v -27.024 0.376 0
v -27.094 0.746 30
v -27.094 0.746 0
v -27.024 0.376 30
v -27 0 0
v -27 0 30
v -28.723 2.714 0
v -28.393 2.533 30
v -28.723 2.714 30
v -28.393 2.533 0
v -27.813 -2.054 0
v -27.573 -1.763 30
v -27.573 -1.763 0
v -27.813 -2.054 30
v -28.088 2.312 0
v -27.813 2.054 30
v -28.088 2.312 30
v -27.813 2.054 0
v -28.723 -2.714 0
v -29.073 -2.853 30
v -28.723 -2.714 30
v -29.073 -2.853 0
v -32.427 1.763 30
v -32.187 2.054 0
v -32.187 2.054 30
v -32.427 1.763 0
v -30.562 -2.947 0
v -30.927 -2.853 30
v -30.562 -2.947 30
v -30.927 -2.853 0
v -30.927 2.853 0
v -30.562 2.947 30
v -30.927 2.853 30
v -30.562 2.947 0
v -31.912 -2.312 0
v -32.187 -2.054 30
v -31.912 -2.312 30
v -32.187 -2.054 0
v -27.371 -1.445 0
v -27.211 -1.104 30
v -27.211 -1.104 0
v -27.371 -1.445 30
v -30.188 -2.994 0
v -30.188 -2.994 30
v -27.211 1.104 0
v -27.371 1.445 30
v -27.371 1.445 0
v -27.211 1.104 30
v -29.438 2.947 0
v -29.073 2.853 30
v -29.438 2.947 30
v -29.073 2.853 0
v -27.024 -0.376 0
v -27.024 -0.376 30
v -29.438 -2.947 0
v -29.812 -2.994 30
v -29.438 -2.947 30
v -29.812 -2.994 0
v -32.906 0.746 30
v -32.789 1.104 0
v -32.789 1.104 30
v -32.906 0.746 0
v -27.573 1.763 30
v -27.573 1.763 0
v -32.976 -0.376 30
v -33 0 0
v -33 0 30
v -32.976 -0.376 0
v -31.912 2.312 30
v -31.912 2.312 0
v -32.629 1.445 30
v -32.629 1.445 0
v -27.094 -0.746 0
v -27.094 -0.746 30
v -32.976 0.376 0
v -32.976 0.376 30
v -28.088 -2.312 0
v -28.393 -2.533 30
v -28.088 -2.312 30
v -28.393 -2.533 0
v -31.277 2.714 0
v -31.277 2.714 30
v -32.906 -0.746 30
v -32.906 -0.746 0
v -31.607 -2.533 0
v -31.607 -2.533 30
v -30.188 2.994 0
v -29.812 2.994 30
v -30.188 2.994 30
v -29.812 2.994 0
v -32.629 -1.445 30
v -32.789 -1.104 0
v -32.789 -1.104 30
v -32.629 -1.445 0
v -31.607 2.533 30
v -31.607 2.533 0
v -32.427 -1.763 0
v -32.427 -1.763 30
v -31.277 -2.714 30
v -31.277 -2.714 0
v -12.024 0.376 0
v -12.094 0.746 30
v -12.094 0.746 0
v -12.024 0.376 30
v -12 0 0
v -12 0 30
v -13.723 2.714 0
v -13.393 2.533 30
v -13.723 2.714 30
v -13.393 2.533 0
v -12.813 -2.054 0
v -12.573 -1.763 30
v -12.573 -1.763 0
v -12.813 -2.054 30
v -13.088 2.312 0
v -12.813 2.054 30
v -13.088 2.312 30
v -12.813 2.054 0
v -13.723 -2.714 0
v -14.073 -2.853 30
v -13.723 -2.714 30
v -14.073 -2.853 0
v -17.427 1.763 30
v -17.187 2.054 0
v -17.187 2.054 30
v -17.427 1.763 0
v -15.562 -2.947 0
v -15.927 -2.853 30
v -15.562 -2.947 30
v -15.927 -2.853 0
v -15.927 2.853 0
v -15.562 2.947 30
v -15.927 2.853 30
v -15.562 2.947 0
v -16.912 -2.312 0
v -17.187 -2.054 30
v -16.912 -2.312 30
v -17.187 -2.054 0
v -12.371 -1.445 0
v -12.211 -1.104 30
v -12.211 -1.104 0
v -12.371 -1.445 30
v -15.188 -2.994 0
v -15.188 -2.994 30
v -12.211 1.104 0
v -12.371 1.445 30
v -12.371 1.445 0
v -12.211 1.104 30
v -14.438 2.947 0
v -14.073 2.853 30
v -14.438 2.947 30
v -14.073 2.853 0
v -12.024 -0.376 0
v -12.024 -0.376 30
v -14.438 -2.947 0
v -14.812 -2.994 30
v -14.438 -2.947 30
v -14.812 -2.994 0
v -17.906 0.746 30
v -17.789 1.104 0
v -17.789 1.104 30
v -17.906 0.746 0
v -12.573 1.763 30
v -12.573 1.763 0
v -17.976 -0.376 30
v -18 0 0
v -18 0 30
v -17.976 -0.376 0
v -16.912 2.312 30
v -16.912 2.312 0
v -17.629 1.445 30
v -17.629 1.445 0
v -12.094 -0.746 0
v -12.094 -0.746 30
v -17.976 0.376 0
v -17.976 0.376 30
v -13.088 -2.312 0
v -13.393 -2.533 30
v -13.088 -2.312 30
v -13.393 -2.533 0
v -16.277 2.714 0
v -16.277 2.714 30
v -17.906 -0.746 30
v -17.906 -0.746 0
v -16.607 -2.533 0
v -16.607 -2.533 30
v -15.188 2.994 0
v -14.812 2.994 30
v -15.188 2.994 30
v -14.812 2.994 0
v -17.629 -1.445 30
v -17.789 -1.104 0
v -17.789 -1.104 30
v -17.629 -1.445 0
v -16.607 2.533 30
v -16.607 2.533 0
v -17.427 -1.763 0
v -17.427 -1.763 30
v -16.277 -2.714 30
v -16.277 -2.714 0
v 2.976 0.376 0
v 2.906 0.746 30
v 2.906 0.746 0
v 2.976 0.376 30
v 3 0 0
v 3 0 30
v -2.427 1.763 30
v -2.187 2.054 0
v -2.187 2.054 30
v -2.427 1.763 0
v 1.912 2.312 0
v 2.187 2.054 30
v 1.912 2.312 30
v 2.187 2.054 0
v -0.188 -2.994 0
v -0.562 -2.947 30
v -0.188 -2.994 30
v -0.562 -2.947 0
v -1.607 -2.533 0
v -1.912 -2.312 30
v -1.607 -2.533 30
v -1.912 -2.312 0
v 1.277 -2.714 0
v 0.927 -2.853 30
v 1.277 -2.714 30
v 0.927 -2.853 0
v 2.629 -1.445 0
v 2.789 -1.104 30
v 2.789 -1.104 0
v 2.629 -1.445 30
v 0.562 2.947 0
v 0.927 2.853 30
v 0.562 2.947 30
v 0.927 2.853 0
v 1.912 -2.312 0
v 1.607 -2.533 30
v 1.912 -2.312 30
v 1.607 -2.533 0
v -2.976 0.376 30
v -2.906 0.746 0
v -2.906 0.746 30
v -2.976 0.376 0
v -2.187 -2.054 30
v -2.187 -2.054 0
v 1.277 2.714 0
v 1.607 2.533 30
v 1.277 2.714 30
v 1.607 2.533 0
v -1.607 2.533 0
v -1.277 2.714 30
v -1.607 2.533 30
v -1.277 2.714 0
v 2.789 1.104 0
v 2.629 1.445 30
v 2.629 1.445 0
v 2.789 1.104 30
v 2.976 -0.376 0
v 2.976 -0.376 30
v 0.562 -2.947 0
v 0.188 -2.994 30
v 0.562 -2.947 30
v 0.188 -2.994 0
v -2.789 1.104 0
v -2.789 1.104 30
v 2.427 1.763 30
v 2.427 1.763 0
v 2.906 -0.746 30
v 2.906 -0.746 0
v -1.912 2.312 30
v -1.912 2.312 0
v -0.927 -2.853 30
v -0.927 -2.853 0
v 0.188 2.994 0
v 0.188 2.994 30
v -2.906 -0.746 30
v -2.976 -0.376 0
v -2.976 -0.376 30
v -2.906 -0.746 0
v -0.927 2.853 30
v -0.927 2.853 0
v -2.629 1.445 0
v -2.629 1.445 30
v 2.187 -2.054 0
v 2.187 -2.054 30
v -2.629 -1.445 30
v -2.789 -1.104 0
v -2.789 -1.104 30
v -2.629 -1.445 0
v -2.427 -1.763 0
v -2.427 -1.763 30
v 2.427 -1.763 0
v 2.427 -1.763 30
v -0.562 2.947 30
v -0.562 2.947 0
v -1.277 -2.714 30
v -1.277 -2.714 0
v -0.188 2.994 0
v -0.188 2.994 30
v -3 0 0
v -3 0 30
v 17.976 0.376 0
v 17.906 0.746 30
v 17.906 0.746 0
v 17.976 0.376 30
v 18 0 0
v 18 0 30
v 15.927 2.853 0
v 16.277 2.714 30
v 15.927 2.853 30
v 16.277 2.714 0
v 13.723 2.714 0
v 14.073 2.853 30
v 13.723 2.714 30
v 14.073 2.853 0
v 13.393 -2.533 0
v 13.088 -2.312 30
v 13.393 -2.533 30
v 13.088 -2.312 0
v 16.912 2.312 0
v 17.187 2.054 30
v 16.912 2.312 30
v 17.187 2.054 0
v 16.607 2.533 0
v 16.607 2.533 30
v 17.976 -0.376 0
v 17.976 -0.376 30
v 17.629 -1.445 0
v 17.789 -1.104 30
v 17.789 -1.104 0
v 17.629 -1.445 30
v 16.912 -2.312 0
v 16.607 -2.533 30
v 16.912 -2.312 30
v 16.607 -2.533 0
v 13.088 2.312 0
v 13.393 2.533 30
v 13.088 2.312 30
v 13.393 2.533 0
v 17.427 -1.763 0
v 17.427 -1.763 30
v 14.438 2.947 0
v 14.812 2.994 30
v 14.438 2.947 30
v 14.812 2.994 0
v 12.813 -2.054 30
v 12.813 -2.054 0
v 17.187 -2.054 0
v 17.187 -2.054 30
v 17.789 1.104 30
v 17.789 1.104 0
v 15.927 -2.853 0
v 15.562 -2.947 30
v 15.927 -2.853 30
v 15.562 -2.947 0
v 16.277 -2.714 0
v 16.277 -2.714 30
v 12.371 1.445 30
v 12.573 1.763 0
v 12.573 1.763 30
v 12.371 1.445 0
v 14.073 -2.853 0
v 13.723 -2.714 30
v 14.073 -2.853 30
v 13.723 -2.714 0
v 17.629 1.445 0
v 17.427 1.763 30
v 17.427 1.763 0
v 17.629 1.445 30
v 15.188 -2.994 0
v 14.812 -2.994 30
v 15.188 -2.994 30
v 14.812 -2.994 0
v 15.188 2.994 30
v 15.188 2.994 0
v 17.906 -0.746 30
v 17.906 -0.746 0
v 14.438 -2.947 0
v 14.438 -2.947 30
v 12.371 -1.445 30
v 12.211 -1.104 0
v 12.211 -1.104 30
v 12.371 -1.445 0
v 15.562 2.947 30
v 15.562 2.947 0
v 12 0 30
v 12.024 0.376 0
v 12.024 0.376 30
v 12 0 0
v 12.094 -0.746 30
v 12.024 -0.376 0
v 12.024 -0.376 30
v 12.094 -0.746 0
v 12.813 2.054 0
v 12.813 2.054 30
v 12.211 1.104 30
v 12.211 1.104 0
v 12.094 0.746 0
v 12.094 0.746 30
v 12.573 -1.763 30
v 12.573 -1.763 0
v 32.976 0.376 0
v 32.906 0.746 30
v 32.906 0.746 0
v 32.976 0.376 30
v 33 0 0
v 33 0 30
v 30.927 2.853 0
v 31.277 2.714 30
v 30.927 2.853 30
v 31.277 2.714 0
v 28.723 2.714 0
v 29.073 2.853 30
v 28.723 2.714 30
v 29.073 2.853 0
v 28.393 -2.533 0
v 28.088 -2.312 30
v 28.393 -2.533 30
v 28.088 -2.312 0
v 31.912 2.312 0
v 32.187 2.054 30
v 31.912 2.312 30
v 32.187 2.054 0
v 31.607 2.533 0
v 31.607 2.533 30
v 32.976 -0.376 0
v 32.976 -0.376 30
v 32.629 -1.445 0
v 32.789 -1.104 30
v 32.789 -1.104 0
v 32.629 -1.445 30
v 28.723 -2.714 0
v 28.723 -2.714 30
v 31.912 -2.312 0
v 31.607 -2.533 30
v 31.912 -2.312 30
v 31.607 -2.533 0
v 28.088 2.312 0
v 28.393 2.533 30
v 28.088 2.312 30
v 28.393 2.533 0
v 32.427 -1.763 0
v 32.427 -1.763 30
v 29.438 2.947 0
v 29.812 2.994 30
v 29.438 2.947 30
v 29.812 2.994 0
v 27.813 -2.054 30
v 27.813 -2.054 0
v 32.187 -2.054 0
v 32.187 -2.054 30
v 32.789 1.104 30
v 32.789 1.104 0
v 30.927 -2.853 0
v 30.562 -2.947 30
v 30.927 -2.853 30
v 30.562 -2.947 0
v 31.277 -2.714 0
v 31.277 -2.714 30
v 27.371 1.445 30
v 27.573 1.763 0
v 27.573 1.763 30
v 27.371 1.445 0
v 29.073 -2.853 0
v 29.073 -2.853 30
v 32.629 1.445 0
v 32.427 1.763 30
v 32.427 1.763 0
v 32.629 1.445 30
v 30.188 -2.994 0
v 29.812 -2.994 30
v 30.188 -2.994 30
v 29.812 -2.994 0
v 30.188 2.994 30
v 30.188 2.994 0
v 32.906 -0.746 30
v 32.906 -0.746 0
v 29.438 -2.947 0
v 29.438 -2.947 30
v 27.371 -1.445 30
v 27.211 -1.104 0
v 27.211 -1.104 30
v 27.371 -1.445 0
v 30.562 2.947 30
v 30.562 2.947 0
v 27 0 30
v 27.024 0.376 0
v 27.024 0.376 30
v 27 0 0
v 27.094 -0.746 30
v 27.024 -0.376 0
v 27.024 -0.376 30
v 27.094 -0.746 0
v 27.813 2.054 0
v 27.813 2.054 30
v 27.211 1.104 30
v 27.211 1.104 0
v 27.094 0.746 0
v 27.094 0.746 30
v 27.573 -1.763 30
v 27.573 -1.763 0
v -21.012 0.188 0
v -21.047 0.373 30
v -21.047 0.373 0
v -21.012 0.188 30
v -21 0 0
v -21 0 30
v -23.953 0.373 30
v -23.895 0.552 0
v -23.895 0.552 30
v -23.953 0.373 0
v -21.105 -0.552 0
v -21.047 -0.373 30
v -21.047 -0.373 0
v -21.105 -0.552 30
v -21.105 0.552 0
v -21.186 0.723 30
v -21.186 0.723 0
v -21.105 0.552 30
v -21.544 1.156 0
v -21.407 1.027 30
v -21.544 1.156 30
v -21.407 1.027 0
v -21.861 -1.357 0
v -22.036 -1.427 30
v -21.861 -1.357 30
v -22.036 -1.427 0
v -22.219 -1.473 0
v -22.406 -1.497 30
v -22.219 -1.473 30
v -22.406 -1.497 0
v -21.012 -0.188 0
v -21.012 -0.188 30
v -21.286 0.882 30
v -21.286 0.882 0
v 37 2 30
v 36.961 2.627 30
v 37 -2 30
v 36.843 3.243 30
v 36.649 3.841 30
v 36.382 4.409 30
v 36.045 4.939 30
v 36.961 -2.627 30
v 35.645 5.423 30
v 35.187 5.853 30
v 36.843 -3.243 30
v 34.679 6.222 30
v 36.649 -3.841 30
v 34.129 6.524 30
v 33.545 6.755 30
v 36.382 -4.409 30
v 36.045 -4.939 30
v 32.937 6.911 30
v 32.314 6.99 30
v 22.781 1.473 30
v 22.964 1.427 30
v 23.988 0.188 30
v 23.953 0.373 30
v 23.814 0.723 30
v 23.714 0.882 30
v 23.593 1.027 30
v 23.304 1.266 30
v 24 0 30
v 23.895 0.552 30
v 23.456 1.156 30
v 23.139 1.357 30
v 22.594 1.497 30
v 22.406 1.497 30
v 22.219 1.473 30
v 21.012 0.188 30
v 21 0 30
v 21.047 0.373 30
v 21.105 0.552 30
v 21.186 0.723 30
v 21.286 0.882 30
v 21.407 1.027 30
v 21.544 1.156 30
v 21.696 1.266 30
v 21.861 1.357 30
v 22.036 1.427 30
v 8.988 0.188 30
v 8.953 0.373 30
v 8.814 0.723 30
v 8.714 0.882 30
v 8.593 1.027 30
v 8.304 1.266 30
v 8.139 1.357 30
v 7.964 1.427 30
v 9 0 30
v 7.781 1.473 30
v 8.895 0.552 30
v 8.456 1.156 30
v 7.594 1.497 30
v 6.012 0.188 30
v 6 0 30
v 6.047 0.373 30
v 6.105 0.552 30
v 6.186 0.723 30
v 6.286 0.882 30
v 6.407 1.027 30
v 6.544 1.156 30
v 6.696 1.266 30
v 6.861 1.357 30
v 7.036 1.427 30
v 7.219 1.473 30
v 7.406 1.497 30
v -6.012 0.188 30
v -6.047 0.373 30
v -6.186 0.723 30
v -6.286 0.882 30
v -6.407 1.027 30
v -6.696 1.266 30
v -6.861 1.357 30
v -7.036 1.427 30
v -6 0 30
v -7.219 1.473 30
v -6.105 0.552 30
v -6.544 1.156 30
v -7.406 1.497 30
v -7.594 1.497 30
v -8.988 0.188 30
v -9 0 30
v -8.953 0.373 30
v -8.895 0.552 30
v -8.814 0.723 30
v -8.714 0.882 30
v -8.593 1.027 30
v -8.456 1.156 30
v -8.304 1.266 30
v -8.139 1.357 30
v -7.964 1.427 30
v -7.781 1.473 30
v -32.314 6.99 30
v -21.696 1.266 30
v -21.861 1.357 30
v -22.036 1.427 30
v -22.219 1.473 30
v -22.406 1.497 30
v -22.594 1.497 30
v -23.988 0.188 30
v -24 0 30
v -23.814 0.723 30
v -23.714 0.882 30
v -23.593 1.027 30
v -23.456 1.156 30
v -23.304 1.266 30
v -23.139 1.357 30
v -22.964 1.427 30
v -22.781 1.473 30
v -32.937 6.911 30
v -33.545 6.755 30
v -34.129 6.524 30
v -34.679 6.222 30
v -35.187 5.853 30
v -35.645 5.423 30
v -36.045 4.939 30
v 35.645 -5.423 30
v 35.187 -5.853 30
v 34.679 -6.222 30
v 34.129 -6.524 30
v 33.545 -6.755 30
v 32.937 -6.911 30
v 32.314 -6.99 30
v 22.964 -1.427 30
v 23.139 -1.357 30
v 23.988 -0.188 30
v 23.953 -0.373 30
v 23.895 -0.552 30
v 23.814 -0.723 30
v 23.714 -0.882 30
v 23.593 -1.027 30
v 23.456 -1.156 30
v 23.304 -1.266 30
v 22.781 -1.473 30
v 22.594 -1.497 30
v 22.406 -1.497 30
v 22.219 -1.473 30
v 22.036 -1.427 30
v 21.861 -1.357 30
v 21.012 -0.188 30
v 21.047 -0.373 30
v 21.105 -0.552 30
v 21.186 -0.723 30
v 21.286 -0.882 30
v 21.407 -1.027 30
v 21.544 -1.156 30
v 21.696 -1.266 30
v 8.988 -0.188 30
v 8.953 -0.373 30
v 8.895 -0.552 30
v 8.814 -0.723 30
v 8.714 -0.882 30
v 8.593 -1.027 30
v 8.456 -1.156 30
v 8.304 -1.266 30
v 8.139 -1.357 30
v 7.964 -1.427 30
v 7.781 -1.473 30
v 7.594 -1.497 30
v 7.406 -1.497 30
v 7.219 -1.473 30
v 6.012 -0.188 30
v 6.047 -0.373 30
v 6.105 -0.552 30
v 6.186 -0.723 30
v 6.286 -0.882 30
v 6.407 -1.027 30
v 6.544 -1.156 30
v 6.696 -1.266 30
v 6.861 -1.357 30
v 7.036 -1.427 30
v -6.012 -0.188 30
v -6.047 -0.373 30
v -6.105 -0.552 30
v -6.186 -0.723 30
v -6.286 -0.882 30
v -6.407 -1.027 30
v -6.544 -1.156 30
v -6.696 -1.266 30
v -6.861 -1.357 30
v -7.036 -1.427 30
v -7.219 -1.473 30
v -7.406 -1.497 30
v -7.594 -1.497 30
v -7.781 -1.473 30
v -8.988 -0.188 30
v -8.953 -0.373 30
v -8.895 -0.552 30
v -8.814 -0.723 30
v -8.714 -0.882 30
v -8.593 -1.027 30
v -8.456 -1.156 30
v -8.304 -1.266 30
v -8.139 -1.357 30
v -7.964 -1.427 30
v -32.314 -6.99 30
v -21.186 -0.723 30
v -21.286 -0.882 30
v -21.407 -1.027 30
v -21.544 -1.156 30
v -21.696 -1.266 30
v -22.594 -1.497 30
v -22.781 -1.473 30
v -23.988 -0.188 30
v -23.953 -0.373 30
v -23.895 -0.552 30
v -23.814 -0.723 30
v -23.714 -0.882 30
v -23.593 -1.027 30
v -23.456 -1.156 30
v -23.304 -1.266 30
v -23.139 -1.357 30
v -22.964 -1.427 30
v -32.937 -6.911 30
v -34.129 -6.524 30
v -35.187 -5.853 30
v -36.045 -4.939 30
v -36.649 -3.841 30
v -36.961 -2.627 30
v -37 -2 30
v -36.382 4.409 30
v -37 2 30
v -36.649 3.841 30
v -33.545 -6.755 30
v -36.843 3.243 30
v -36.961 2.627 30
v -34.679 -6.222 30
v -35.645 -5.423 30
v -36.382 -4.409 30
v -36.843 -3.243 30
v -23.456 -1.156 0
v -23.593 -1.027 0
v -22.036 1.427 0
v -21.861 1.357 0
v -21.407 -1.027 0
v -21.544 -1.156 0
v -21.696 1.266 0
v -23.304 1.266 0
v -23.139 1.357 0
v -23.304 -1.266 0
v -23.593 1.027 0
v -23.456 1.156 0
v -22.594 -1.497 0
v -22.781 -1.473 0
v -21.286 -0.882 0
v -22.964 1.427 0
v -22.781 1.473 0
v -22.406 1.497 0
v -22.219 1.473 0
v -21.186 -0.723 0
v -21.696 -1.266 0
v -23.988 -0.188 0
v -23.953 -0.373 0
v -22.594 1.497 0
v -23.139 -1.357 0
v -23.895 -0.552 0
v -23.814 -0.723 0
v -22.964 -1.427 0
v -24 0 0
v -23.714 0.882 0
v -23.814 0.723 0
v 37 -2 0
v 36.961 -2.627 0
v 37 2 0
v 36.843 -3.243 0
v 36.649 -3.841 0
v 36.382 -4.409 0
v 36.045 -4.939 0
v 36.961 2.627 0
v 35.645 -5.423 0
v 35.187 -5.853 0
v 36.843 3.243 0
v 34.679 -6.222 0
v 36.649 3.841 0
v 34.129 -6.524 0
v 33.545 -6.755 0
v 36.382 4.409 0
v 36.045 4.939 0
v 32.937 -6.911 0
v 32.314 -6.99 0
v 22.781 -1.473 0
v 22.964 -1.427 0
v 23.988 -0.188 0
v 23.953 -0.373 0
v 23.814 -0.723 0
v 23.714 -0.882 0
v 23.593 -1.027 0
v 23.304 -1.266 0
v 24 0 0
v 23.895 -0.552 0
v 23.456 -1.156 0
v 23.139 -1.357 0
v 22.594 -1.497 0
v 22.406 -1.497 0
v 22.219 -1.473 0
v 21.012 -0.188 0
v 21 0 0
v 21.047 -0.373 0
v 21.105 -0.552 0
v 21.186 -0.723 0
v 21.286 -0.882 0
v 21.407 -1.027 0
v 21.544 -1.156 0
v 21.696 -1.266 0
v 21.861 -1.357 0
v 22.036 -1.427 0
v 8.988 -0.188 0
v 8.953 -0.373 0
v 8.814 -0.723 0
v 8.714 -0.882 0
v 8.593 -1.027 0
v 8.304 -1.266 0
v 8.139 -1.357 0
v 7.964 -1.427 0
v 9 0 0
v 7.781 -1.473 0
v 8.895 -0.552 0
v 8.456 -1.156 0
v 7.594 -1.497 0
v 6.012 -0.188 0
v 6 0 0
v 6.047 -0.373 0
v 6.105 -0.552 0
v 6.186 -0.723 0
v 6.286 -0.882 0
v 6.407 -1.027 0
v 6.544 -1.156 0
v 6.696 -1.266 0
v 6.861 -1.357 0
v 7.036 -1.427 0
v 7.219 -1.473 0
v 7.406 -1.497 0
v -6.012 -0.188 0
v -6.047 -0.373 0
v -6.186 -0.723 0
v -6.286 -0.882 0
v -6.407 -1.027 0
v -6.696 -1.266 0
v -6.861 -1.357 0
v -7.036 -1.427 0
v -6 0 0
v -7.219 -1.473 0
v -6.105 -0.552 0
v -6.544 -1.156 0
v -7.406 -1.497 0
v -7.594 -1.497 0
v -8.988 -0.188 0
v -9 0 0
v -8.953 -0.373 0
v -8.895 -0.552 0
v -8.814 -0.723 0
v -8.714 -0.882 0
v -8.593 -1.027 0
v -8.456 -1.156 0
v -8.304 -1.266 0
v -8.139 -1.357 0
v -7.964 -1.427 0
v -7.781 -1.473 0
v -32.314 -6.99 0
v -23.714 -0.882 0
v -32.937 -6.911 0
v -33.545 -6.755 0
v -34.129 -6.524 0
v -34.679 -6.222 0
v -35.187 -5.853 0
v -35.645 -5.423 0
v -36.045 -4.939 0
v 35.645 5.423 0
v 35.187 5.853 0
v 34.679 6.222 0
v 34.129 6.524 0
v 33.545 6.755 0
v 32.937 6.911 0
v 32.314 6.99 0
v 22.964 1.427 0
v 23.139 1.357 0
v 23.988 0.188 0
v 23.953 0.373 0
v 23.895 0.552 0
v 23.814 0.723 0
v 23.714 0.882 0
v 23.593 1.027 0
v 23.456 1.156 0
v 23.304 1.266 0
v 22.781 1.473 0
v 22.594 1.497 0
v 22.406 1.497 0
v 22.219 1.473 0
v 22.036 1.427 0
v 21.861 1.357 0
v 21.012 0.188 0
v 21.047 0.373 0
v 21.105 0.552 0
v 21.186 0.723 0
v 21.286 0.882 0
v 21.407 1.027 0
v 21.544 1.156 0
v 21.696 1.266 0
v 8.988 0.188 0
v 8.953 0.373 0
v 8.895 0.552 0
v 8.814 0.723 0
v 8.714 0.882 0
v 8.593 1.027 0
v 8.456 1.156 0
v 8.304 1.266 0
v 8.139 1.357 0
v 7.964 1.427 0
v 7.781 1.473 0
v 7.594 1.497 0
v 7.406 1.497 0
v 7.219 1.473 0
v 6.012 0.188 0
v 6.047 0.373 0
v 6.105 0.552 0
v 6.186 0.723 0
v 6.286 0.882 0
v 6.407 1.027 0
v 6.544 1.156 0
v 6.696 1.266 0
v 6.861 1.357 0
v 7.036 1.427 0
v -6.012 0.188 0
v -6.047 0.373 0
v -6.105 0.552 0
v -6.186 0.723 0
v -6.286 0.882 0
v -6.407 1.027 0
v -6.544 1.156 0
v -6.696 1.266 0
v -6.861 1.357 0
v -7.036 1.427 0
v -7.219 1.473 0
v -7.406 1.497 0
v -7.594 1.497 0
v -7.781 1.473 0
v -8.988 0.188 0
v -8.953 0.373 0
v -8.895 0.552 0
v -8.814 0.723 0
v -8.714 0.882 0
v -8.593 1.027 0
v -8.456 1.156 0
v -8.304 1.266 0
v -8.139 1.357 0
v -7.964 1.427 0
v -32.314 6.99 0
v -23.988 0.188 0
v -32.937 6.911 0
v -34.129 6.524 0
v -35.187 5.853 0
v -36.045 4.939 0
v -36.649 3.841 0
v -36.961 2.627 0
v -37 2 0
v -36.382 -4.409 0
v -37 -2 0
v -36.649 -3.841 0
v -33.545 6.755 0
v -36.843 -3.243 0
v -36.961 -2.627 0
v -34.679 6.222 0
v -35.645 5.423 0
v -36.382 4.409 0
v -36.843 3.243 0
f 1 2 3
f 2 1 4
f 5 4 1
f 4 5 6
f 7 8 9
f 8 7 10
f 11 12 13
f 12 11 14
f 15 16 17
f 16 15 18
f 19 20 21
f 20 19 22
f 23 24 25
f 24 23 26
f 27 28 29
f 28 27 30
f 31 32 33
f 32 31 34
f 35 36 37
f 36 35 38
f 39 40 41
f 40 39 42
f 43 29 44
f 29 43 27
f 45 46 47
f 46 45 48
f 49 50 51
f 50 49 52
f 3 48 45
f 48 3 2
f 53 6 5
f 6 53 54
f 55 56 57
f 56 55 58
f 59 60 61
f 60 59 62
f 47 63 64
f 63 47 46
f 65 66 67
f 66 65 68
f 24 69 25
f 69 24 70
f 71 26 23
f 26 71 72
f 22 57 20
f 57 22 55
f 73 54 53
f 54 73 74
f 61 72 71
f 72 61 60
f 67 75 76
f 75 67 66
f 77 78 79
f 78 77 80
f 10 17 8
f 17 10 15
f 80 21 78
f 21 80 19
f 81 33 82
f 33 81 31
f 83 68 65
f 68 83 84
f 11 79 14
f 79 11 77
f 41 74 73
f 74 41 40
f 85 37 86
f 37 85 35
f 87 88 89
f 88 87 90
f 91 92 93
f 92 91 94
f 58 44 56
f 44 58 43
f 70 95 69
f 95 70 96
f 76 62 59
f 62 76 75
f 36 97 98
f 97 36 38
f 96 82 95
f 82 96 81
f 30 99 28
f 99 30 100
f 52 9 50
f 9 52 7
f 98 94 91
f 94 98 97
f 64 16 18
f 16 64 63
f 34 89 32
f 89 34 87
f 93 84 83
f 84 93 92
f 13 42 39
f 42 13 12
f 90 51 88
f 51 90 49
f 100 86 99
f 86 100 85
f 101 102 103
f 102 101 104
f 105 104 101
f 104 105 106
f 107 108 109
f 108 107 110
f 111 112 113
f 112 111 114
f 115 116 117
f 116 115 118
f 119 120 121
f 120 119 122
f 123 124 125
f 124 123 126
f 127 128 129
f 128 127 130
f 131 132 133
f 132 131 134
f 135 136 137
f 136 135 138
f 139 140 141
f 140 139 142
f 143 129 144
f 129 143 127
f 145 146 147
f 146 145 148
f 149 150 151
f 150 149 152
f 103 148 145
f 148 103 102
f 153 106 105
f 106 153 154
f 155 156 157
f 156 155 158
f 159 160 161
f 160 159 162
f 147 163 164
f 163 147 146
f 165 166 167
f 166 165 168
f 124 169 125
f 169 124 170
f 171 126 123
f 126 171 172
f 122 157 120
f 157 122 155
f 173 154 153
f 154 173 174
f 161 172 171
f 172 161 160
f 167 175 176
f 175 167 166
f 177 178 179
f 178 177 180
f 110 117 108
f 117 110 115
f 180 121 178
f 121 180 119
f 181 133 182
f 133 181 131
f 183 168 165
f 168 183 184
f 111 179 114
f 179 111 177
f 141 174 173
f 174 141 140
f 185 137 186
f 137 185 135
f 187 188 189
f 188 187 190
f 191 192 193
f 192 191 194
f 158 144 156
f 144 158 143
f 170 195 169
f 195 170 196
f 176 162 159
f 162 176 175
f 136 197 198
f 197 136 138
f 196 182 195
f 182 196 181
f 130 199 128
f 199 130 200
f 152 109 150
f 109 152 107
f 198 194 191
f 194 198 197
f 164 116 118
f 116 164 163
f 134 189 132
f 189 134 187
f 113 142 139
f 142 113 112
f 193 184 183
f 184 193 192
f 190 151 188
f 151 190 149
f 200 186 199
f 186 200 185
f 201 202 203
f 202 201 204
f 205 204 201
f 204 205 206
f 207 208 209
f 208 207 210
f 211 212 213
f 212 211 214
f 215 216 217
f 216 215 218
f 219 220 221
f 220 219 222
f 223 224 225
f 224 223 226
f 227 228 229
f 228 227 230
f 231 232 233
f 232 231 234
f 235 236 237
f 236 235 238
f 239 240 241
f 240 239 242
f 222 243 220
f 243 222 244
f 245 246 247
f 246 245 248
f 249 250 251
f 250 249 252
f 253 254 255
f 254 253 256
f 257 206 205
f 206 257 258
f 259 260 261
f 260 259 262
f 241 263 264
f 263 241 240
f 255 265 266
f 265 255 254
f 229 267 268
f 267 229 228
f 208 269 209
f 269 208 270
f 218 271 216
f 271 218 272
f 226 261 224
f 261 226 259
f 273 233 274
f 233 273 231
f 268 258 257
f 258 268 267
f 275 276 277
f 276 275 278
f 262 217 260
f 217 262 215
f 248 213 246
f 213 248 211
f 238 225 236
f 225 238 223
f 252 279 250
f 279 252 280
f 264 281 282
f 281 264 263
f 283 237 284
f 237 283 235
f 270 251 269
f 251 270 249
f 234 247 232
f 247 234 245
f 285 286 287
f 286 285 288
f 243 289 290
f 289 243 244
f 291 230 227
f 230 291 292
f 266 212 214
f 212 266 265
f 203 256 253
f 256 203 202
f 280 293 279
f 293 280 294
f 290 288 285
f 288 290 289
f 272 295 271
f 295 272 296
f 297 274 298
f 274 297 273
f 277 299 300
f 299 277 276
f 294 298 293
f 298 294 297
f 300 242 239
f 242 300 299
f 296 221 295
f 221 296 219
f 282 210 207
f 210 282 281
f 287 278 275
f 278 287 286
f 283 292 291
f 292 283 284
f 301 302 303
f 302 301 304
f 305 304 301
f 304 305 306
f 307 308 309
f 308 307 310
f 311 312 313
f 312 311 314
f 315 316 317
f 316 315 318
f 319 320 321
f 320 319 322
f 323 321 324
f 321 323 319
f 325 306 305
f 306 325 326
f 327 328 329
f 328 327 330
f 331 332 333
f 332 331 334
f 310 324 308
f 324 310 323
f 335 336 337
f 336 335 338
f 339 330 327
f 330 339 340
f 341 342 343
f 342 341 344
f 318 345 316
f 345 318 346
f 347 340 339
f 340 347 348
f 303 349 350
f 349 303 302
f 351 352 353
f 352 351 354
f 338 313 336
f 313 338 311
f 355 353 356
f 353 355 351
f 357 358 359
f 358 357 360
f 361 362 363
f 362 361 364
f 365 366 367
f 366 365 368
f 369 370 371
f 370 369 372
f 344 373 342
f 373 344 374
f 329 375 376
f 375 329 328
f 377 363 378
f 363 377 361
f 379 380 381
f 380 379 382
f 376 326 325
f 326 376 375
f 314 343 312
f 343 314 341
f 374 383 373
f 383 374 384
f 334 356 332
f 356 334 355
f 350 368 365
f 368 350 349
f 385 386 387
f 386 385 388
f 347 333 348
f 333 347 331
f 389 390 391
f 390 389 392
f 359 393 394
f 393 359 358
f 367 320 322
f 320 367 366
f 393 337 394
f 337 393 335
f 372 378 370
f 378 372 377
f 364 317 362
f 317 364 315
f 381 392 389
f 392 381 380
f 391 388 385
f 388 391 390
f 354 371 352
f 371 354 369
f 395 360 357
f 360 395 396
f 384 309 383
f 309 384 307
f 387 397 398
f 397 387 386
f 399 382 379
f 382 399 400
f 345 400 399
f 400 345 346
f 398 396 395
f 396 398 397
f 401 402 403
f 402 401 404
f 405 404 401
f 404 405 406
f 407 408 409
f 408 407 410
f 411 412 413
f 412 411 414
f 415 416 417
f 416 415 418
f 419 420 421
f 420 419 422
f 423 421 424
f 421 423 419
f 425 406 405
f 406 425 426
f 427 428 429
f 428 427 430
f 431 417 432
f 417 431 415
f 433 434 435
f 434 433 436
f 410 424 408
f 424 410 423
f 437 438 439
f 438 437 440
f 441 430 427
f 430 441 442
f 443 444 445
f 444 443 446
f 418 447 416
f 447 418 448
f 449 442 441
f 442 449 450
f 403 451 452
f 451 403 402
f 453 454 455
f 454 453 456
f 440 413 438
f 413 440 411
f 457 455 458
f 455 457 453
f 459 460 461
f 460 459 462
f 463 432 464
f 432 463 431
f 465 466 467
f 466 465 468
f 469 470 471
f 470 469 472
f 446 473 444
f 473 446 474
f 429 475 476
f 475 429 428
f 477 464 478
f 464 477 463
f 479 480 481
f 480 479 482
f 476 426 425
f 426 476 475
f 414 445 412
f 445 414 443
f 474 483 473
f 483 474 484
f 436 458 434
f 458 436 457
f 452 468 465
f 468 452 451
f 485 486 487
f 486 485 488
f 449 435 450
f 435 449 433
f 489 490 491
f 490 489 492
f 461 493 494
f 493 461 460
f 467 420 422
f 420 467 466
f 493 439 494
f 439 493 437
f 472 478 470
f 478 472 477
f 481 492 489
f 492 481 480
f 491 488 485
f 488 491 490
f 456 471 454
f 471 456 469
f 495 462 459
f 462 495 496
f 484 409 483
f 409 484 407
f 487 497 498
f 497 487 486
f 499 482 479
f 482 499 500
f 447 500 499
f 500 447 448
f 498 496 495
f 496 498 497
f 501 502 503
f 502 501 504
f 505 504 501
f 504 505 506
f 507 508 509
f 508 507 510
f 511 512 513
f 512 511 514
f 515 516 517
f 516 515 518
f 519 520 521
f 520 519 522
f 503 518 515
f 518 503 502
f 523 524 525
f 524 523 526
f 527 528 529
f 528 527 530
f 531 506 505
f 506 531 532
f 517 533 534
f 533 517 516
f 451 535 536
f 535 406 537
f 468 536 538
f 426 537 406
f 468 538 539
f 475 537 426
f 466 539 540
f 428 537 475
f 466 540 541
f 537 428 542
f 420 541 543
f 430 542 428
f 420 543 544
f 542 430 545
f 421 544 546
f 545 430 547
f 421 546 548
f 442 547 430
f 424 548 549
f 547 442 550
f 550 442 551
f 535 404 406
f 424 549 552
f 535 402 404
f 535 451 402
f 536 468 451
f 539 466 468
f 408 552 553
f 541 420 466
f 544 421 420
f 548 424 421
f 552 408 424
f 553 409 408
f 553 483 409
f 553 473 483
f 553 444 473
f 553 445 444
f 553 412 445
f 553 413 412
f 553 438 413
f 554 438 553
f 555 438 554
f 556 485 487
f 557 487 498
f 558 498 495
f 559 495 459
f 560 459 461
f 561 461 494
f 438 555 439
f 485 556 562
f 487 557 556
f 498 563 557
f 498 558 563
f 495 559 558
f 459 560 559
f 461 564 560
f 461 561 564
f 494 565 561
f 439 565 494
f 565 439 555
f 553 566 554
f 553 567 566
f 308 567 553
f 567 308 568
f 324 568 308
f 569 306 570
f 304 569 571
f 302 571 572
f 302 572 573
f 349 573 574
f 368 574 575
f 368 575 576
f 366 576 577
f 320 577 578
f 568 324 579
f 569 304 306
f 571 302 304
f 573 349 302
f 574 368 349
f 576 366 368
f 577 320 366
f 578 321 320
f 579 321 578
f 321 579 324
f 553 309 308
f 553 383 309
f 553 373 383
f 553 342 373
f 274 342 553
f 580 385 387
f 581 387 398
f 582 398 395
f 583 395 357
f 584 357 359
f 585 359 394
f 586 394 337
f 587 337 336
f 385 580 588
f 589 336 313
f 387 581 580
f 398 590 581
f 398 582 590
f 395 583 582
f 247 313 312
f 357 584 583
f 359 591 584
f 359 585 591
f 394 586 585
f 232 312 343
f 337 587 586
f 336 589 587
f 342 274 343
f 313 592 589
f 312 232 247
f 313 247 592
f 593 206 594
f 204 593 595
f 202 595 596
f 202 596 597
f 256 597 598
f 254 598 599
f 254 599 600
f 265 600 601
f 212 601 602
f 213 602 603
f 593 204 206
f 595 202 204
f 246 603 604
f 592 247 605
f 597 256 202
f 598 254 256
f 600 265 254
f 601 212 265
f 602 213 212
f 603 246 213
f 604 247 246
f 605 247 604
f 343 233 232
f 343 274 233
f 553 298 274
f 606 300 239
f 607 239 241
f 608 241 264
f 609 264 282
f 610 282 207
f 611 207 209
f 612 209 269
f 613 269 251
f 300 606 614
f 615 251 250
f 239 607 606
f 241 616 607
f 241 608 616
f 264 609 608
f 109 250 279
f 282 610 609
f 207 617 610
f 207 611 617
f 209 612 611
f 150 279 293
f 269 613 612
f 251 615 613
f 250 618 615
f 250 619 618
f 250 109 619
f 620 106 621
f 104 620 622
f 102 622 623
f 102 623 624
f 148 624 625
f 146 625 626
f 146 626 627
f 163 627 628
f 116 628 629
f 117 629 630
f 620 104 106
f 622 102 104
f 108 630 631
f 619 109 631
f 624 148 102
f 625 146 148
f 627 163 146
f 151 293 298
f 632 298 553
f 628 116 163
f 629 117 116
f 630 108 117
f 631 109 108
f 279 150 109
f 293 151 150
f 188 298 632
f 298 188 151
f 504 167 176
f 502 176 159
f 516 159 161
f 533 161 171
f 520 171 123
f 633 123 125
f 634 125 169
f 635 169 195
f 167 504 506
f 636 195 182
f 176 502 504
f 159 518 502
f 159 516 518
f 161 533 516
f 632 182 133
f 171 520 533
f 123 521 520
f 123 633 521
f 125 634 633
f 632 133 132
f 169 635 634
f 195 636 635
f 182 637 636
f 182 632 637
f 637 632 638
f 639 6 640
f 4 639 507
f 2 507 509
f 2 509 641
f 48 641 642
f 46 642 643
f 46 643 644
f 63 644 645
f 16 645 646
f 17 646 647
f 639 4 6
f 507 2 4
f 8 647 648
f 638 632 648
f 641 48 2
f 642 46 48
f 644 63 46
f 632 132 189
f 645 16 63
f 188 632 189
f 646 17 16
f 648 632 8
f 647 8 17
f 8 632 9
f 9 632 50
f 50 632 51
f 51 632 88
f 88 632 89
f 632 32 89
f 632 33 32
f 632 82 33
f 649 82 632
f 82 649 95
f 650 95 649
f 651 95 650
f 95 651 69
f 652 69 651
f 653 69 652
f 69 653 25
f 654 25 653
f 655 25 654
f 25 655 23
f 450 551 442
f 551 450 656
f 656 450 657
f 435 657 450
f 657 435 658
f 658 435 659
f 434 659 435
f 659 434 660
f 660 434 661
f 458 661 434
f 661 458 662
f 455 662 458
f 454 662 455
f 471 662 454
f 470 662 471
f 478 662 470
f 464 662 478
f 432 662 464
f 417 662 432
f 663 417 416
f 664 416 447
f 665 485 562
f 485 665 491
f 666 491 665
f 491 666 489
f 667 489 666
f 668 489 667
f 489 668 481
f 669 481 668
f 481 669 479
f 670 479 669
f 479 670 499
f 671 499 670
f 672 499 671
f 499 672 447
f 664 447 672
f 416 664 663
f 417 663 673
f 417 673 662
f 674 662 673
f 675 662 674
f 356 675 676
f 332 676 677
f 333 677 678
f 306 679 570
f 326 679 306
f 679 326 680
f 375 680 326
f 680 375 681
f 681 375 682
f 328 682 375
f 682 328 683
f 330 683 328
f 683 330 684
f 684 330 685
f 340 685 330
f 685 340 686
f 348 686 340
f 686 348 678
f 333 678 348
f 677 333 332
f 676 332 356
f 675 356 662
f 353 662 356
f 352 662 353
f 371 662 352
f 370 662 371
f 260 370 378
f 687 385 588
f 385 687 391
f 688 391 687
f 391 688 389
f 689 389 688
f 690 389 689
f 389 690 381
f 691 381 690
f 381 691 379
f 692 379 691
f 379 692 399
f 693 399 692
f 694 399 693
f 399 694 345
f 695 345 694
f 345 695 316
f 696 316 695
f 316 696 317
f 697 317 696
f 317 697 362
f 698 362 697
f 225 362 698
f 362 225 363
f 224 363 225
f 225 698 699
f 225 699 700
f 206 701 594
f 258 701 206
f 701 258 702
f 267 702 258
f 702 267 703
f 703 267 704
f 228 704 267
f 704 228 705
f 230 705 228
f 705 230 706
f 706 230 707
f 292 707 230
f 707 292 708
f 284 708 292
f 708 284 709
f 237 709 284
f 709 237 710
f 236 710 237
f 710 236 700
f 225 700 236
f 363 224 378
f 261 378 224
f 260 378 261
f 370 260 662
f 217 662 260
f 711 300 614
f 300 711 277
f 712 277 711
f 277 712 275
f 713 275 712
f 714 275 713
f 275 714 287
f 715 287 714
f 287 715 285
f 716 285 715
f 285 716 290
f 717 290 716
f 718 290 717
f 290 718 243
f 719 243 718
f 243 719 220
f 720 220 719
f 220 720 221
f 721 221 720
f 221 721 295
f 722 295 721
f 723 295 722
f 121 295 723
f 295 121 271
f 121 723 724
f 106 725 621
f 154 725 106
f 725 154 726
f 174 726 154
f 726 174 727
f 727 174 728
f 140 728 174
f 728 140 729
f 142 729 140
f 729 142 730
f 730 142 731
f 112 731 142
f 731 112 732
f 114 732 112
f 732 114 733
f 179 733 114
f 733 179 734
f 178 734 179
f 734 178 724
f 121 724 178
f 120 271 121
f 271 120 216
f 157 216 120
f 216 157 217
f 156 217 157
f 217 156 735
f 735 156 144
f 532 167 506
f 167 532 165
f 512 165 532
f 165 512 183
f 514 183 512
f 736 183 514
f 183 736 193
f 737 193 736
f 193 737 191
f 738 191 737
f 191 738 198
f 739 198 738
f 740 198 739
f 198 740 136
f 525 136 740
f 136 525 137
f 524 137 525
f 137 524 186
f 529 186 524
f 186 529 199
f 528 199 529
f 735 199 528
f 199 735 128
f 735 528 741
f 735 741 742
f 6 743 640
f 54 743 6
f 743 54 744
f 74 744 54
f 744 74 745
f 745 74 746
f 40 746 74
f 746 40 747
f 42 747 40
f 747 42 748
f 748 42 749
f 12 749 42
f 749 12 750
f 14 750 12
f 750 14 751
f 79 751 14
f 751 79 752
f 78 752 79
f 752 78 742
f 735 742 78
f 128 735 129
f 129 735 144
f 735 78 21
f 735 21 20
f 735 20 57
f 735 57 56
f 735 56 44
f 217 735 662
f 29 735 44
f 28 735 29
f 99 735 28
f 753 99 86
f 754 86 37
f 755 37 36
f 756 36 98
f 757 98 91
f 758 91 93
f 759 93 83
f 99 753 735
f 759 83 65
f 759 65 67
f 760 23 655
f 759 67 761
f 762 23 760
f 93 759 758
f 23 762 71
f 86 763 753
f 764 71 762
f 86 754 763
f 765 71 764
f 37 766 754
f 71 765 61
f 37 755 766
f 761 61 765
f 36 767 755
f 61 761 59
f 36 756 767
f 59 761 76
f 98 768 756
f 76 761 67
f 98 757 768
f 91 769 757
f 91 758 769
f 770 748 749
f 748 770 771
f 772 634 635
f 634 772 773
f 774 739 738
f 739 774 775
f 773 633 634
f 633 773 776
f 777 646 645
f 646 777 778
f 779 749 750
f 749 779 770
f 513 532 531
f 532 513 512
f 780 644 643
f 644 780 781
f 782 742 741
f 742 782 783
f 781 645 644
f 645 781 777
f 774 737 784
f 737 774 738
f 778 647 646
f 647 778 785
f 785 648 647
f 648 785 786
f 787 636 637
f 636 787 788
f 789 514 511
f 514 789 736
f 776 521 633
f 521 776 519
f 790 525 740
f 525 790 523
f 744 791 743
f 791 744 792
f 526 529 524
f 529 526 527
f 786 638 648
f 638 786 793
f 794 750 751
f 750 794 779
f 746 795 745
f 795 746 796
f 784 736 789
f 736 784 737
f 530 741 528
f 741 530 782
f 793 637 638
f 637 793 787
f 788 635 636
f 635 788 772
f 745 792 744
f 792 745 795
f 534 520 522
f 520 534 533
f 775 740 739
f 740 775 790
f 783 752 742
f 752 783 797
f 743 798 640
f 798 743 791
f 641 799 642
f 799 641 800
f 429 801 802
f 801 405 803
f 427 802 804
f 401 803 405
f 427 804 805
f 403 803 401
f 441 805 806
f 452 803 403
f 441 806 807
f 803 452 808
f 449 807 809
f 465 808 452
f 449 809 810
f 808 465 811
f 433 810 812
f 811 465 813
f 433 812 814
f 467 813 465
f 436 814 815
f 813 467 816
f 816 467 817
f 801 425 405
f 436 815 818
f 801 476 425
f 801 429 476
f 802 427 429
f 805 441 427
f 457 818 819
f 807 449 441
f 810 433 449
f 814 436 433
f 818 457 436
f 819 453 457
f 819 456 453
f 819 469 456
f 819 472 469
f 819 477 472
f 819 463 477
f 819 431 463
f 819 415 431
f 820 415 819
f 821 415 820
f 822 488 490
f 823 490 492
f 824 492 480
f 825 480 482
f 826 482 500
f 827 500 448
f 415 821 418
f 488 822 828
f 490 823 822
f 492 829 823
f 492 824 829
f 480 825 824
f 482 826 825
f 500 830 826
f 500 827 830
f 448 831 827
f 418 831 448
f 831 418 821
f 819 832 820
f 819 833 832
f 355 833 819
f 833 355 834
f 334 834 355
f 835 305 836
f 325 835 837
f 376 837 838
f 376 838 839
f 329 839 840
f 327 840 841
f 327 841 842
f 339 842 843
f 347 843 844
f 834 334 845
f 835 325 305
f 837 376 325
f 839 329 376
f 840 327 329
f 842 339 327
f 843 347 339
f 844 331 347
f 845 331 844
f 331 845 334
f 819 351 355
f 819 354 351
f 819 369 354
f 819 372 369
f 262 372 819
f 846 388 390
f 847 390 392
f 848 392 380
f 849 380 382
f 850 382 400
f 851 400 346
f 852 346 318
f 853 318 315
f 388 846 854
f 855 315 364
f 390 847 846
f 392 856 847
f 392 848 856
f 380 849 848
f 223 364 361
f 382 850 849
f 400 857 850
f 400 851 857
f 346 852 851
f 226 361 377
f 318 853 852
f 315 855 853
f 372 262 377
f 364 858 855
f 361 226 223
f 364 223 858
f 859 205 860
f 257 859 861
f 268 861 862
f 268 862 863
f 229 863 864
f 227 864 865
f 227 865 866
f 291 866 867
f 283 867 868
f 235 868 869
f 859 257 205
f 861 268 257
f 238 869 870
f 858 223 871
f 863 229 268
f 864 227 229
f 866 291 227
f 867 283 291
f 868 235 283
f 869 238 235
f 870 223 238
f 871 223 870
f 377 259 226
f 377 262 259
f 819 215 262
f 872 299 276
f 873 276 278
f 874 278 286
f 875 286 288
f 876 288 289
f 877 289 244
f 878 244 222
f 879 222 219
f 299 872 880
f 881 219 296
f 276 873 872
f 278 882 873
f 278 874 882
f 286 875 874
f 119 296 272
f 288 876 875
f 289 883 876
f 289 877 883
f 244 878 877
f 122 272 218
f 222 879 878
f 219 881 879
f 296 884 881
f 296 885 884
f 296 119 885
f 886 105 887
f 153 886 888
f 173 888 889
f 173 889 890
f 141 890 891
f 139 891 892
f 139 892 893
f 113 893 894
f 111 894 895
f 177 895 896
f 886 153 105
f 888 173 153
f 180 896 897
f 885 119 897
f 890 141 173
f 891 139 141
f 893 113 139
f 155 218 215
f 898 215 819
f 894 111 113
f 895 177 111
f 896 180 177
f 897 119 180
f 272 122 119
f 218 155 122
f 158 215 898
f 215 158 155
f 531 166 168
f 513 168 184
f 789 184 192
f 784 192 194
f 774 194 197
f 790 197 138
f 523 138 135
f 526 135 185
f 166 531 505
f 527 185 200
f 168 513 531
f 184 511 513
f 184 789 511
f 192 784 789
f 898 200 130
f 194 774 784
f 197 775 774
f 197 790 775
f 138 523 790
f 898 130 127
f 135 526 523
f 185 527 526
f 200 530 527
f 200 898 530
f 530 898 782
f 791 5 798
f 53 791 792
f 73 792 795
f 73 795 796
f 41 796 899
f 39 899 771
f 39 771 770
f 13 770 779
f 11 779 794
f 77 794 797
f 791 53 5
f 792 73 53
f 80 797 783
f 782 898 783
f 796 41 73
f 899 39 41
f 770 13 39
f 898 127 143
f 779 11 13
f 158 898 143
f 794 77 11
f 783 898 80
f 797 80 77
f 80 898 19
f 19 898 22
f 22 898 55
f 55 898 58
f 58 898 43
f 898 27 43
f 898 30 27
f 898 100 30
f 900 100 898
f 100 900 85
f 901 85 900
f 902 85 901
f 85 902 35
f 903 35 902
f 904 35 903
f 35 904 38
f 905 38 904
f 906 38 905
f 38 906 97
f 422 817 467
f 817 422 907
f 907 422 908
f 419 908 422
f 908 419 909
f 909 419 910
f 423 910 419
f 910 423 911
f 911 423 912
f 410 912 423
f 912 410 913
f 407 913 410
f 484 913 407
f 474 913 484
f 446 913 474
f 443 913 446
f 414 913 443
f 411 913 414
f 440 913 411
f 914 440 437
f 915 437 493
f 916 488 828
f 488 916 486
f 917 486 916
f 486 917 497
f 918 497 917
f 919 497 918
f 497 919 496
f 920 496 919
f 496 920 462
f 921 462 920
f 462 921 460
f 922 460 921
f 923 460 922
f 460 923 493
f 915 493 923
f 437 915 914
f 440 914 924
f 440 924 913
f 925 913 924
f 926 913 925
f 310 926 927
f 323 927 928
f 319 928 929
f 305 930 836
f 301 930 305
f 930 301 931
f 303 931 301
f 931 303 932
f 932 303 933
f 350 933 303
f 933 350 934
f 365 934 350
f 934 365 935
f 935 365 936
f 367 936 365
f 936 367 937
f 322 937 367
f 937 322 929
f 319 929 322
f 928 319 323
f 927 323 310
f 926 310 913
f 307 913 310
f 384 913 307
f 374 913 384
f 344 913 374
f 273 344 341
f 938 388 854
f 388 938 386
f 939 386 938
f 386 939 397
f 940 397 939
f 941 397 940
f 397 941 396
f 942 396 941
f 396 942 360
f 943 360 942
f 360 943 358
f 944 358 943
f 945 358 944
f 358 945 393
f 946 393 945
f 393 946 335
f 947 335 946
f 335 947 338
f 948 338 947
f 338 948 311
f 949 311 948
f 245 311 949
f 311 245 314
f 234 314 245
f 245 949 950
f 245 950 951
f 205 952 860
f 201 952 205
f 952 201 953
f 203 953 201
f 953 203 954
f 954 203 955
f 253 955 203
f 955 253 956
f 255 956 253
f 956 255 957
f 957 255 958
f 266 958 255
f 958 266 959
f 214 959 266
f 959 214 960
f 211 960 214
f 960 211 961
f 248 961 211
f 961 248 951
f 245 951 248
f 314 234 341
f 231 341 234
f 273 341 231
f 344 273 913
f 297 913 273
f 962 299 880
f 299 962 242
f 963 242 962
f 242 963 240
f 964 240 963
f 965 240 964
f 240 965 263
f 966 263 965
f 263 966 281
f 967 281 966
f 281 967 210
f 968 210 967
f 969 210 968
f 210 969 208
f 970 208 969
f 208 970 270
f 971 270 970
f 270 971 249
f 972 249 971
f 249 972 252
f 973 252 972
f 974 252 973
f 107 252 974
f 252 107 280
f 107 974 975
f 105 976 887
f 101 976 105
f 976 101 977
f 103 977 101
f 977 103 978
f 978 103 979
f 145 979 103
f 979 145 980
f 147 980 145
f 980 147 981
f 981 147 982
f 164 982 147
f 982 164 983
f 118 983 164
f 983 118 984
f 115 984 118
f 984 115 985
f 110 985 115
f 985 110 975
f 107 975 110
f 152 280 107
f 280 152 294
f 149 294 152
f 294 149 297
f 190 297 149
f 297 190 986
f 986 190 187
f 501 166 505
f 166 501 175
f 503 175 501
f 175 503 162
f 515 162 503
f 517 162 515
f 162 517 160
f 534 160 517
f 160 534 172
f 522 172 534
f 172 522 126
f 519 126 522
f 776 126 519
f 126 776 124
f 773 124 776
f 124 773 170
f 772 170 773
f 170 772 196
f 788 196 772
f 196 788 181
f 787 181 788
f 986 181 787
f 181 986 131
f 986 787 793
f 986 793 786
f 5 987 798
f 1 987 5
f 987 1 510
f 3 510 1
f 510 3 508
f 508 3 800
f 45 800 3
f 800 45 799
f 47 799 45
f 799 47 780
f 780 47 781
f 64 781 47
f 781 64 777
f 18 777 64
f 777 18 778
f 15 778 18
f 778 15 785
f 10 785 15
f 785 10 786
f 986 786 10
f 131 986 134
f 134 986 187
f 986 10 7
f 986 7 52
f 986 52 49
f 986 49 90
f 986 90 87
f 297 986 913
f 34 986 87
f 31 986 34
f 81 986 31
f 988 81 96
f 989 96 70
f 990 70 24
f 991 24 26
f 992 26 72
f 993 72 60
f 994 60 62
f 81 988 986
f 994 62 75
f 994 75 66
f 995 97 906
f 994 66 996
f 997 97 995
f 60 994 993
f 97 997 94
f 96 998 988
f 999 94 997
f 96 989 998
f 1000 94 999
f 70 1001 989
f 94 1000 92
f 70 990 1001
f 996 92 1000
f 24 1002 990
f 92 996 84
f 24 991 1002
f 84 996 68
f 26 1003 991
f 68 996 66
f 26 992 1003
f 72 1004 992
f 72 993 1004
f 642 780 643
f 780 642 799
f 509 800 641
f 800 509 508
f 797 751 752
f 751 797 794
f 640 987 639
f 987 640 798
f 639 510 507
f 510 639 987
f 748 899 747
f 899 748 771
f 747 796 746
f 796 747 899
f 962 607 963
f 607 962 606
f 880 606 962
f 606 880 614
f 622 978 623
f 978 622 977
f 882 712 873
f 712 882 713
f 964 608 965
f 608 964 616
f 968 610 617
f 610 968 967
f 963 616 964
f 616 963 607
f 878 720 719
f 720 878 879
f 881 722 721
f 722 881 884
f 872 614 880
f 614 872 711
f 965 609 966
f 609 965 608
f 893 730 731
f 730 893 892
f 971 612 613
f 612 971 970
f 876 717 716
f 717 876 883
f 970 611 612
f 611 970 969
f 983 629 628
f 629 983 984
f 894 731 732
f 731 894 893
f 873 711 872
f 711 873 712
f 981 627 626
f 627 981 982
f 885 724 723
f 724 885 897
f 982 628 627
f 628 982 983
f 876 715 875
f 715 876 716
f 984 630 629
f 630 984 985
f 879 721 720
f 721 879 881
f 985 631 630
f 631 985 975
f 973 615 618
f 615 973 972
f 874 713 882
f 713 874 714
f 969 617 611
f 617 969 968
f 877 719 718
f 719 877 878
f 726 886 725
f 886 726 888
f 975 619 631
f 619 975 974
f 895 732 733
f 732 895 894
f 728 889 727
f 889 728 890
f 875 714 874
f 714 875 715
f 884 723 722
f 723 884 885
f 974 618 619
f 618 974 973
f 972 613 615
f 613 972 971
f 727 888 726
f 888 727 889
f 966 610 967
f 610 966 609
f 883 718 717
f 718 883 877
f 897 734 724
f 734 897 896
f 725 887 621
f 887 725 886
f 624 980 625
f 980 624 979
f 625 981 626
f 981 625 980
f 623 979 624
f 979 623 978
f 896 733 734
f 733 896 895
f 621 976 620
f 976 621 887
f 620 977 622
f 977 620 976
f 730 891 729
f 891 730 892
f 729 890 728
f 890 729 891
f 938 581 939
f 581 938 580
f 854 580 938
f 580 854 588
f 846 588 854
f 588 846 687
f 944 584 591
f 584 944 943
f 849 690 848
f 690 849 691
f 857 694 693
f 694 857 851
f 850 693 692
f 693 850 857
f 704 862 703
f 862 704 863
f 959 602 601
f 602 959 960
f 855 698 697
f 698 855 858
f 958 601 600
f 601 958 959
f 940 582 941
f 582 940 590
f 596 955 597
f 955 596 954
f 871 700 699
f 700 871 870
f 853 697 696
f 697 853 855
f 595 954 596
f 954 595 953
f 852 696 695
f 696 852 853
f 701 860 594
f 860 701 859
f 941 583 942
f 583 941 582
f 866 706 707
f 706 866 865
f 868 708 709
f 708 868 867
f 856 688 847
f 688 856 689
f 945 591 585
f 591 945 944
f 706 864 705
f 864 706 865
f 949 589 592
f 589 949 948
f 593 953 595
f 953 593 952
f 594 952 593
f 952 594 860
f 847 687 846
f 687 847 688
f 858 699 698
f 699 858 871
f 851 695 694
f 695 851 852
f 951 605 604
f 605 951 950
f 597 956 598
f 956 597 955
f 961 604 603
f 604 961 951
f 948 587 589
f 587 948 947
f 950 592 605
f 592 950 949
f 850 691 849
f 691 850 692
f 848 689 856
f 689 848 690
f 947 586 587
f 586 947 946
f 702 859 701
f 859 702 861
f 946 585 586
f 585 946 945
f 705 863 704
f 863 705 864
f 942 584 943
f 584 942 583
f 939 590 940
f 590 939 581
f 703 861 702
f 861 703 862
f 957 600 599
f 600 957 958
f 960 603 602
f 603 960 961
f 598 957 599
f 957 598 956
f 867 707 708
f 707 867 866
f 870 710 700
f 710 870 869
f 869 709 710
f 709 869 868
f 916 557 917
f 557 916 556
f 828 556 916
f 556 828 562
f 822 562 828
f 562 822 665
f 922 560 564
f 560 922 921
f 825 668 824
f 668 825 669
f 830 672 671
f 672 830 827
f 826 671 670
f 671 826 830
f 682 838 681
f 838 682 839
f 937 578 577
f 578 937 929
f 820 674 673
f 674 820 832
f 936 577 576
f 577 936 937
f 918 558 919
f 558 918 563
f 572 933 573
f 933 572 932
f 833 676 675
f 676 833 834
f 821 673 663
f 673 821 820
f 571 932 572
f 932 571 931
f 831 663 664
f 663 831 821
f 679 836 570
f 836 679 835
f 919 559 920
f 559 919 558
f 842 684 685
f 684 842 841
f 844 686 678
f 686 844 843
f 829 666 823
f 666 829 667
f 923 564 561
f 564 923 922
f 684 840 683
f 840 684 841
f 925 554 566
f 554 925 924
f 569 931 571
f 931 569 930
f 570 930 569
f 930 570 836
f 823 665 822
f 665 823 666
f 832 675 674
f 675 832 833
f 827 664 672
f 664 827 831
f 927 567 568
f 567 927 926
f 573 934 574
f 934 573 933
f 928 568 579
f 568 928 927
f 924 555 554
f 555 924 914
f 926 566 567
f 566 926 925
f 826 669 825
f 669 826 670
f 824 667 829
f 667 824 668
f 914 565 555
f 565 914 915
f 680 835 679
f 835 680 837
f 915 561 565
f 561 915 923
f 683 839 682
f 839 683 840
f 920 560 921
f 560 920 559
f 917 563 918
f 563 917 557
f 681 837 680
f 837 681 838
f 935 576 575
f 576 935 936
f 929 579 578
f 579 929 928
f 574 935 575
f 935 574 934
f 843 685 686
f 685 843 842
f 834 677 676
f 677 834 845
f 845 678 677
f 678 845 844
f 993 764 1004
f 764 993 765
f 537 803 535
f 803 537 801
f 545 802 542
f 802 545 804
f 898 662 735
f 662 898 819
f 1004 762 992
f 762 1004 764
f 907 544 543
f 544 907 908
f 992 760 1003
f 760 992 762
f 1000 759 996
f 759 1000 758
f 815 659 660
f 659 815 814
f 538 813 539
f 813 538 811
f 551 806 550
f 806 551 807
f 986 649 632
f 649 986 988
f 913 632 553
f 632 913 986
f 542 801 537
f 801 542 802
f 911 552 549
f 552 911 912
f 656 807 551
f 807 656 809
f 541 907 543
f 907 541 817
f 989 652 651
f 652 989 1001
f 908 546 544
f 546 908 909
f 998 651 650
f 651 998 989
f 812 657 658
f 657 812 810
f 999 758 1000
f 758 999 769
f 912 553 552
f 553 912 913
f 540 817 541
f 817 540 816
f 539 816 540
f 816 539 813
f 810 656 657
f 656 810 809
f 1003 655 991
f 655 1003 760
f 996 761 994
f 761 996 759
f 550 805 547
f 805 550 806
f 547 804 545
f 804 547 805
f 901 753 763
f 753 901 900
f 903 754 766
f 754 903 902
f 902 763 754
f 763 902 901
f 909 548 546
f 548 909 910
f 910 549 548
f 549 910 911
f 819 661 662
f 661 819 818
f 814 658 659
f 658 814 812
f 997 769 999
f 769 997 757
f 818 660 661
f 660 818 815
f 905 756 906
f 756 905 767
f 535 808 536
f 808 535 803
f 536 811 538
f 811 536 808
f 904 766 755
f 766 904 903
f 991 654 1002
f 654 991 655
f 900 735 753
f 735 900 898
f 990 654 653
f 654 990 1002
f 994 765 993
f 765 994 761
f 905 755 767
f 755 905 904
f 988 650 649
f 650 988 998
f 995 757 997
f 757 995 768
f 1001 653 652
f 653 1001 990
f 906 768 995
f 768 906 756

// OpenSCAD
$fn = 50;


difference() {
	union() {
		hull() {
			translate(v = [-32.0000000000, 2.0000000000, 0]) {
				cylinder(h = 30, r = 5);
			}
			translate(v = [32.0000000000, 2.0000000000, 0]) {
				cylinder(h = 30, r = 5);
			}
			translate(v = [-32.0000000000, -2.0000000000, 0]) {
				cylinder(h = 30, r = 5);
			}
			translate(v = [32.0000000000, -2.0000000000, 0]) {
				cylinder(h = 30, r = 5);
			}
		}
	}
	union() {
		translate(v = [-30.0000000000, 0.0000000000, -100.0000000000]) {
			cylinder(h = 200, r = 3.0000000000);
		}
		translate(v = [-15.0000000000, 0.0000000000, -100.0000000000]) {
			cylinder(h = 200, r = 3.0000000000);
		}
		translate(v = [0.0000000000, 0.0000000000, -100.0000000000]) {
			cylinder(h = 200, r = 3.0000000000);
		}
		translate(v = [15.0000000000, 0.0000000000, -100.0000000000]) {
			cylinder(h = 200, r = 3.0000000000);
		}
		translate(v = [30.0000000000, 0.0000000000, -100.0000000000]) {
			cylinder(h = 200, r = 3.0000000000);
		}
		translate(v = [-30.0000000000, 0.0000000000, 0]) {
			cylinder(h = 30, r = 1.5000000000);
		}
		translate(v = [-22.5000000000, 0.0000000000, 0]) {
			cylinder(h = 30, r = 1.5000000000);
		}
		translate(v = [-15.0000000000, 0.0000000000, 0]) {
			cylinder(h = 30, r = 1.5000000000);
		}
		translate(v = [-7.5000000000, 0.0000000000, 0]) {
			cylinder(h = 30, r = 1.5000000000);
		}
		cylinder(h = 30, r = 1.5000000000);
		translate(v = [7.5000000000, 0.0000000000, 0]) {
			cylinder(h = 30, r = 1.5000000000);
		}
		translate(v = [15.0000000000, 0.0000000000, 0]) {
			cylinder(h = 30, r = 1.5000000000);
		}
		translate(v = [22.5000000000, 0.0000000000, 0]) {
			cylinder(h = 30, r = 1.5000000000);
		}
		translate(v = [30.0000000000, 0.0000000000, 0]) {
			cylinder(h = 30, r = 1.5000000000);
		}
		translate(v = [-30.0000000000, 0.0000000000, 0]) {
			cylinder(h = 30, r = 1.5000000000);
		}
		translate(v = [-22.5000000000, 0.0000000000, 0]) {
			cylinder(h = 30, r = 1.5000000000);
		}
		translate(v = [-15.0000000000, 0.0000000000, 0]) {
			cylinder(h = 30, r = 1.5000000000);
		}
		translate(v = [-7.5000000000, 0.0000000000, 0]) {
			cylinder(h = 30, r = 1.5000000000);
		}
		cylinder(h = 30, r = 1.5000000000);
		translate(v = [7.5000000000, 0.0000000000, 0]) {
			cylinder(h = 30, r = 1.5000000000);
		}
		translate(v = [15.0000000000, 0.0000000000, 0]) {
			cylinder(h = 30, r = 1.5000000000);
		}
		translate(v = [22.5000000000, 0.0000000000, 0]) {
			cylinder(h = 30, r = 1.5000000000);
		}
		translate(v = [30.0000000000, 0.0000000000, 0]) {
			cylinder(h = 30, r = 1.5000000000);
		}
		translate(v = [-30.0000000000, 0.0000000000, 0]) {
			cylinder(h = 30, r = 1.5000000000);
		}
		translate(v = [-22.5000000000, 0.0000000000, 0]) {
			cylinder(h = 30, r = 1.5000000000);
		}
		translate(v = [-15.0000000000, 0.0000000000, 0]) {
			cylinder(h = 30, r = 1.5000000000);
		}
		translate(v = [-7.5000000000, 0.0000000000, 0]) {
			cylinder(h = 30, r = 1.5000000000);
		}
		cylinder(h = 30, r = 1.5000000000);
		translate(v = [7.5000000000, 0.0000000000, 0]) {
			cylinder(h = 30, r = 1.5000000000);
		}
		translate(v = [15.0000000000, 0.0000000000, 0]) {
			cylinder(h = 30, r = 1.5000000000);
		}
		translate(v = [22.5000000000, 0.0000000000, 0]) {
			cylinder(h = 30, r = 1.5000000000);
		}
		translate(v = [30.0000000000, 0.0000000000, 0]) {
			cylinder(h = 30, r = 1.5000000000);
		}
	}
}
